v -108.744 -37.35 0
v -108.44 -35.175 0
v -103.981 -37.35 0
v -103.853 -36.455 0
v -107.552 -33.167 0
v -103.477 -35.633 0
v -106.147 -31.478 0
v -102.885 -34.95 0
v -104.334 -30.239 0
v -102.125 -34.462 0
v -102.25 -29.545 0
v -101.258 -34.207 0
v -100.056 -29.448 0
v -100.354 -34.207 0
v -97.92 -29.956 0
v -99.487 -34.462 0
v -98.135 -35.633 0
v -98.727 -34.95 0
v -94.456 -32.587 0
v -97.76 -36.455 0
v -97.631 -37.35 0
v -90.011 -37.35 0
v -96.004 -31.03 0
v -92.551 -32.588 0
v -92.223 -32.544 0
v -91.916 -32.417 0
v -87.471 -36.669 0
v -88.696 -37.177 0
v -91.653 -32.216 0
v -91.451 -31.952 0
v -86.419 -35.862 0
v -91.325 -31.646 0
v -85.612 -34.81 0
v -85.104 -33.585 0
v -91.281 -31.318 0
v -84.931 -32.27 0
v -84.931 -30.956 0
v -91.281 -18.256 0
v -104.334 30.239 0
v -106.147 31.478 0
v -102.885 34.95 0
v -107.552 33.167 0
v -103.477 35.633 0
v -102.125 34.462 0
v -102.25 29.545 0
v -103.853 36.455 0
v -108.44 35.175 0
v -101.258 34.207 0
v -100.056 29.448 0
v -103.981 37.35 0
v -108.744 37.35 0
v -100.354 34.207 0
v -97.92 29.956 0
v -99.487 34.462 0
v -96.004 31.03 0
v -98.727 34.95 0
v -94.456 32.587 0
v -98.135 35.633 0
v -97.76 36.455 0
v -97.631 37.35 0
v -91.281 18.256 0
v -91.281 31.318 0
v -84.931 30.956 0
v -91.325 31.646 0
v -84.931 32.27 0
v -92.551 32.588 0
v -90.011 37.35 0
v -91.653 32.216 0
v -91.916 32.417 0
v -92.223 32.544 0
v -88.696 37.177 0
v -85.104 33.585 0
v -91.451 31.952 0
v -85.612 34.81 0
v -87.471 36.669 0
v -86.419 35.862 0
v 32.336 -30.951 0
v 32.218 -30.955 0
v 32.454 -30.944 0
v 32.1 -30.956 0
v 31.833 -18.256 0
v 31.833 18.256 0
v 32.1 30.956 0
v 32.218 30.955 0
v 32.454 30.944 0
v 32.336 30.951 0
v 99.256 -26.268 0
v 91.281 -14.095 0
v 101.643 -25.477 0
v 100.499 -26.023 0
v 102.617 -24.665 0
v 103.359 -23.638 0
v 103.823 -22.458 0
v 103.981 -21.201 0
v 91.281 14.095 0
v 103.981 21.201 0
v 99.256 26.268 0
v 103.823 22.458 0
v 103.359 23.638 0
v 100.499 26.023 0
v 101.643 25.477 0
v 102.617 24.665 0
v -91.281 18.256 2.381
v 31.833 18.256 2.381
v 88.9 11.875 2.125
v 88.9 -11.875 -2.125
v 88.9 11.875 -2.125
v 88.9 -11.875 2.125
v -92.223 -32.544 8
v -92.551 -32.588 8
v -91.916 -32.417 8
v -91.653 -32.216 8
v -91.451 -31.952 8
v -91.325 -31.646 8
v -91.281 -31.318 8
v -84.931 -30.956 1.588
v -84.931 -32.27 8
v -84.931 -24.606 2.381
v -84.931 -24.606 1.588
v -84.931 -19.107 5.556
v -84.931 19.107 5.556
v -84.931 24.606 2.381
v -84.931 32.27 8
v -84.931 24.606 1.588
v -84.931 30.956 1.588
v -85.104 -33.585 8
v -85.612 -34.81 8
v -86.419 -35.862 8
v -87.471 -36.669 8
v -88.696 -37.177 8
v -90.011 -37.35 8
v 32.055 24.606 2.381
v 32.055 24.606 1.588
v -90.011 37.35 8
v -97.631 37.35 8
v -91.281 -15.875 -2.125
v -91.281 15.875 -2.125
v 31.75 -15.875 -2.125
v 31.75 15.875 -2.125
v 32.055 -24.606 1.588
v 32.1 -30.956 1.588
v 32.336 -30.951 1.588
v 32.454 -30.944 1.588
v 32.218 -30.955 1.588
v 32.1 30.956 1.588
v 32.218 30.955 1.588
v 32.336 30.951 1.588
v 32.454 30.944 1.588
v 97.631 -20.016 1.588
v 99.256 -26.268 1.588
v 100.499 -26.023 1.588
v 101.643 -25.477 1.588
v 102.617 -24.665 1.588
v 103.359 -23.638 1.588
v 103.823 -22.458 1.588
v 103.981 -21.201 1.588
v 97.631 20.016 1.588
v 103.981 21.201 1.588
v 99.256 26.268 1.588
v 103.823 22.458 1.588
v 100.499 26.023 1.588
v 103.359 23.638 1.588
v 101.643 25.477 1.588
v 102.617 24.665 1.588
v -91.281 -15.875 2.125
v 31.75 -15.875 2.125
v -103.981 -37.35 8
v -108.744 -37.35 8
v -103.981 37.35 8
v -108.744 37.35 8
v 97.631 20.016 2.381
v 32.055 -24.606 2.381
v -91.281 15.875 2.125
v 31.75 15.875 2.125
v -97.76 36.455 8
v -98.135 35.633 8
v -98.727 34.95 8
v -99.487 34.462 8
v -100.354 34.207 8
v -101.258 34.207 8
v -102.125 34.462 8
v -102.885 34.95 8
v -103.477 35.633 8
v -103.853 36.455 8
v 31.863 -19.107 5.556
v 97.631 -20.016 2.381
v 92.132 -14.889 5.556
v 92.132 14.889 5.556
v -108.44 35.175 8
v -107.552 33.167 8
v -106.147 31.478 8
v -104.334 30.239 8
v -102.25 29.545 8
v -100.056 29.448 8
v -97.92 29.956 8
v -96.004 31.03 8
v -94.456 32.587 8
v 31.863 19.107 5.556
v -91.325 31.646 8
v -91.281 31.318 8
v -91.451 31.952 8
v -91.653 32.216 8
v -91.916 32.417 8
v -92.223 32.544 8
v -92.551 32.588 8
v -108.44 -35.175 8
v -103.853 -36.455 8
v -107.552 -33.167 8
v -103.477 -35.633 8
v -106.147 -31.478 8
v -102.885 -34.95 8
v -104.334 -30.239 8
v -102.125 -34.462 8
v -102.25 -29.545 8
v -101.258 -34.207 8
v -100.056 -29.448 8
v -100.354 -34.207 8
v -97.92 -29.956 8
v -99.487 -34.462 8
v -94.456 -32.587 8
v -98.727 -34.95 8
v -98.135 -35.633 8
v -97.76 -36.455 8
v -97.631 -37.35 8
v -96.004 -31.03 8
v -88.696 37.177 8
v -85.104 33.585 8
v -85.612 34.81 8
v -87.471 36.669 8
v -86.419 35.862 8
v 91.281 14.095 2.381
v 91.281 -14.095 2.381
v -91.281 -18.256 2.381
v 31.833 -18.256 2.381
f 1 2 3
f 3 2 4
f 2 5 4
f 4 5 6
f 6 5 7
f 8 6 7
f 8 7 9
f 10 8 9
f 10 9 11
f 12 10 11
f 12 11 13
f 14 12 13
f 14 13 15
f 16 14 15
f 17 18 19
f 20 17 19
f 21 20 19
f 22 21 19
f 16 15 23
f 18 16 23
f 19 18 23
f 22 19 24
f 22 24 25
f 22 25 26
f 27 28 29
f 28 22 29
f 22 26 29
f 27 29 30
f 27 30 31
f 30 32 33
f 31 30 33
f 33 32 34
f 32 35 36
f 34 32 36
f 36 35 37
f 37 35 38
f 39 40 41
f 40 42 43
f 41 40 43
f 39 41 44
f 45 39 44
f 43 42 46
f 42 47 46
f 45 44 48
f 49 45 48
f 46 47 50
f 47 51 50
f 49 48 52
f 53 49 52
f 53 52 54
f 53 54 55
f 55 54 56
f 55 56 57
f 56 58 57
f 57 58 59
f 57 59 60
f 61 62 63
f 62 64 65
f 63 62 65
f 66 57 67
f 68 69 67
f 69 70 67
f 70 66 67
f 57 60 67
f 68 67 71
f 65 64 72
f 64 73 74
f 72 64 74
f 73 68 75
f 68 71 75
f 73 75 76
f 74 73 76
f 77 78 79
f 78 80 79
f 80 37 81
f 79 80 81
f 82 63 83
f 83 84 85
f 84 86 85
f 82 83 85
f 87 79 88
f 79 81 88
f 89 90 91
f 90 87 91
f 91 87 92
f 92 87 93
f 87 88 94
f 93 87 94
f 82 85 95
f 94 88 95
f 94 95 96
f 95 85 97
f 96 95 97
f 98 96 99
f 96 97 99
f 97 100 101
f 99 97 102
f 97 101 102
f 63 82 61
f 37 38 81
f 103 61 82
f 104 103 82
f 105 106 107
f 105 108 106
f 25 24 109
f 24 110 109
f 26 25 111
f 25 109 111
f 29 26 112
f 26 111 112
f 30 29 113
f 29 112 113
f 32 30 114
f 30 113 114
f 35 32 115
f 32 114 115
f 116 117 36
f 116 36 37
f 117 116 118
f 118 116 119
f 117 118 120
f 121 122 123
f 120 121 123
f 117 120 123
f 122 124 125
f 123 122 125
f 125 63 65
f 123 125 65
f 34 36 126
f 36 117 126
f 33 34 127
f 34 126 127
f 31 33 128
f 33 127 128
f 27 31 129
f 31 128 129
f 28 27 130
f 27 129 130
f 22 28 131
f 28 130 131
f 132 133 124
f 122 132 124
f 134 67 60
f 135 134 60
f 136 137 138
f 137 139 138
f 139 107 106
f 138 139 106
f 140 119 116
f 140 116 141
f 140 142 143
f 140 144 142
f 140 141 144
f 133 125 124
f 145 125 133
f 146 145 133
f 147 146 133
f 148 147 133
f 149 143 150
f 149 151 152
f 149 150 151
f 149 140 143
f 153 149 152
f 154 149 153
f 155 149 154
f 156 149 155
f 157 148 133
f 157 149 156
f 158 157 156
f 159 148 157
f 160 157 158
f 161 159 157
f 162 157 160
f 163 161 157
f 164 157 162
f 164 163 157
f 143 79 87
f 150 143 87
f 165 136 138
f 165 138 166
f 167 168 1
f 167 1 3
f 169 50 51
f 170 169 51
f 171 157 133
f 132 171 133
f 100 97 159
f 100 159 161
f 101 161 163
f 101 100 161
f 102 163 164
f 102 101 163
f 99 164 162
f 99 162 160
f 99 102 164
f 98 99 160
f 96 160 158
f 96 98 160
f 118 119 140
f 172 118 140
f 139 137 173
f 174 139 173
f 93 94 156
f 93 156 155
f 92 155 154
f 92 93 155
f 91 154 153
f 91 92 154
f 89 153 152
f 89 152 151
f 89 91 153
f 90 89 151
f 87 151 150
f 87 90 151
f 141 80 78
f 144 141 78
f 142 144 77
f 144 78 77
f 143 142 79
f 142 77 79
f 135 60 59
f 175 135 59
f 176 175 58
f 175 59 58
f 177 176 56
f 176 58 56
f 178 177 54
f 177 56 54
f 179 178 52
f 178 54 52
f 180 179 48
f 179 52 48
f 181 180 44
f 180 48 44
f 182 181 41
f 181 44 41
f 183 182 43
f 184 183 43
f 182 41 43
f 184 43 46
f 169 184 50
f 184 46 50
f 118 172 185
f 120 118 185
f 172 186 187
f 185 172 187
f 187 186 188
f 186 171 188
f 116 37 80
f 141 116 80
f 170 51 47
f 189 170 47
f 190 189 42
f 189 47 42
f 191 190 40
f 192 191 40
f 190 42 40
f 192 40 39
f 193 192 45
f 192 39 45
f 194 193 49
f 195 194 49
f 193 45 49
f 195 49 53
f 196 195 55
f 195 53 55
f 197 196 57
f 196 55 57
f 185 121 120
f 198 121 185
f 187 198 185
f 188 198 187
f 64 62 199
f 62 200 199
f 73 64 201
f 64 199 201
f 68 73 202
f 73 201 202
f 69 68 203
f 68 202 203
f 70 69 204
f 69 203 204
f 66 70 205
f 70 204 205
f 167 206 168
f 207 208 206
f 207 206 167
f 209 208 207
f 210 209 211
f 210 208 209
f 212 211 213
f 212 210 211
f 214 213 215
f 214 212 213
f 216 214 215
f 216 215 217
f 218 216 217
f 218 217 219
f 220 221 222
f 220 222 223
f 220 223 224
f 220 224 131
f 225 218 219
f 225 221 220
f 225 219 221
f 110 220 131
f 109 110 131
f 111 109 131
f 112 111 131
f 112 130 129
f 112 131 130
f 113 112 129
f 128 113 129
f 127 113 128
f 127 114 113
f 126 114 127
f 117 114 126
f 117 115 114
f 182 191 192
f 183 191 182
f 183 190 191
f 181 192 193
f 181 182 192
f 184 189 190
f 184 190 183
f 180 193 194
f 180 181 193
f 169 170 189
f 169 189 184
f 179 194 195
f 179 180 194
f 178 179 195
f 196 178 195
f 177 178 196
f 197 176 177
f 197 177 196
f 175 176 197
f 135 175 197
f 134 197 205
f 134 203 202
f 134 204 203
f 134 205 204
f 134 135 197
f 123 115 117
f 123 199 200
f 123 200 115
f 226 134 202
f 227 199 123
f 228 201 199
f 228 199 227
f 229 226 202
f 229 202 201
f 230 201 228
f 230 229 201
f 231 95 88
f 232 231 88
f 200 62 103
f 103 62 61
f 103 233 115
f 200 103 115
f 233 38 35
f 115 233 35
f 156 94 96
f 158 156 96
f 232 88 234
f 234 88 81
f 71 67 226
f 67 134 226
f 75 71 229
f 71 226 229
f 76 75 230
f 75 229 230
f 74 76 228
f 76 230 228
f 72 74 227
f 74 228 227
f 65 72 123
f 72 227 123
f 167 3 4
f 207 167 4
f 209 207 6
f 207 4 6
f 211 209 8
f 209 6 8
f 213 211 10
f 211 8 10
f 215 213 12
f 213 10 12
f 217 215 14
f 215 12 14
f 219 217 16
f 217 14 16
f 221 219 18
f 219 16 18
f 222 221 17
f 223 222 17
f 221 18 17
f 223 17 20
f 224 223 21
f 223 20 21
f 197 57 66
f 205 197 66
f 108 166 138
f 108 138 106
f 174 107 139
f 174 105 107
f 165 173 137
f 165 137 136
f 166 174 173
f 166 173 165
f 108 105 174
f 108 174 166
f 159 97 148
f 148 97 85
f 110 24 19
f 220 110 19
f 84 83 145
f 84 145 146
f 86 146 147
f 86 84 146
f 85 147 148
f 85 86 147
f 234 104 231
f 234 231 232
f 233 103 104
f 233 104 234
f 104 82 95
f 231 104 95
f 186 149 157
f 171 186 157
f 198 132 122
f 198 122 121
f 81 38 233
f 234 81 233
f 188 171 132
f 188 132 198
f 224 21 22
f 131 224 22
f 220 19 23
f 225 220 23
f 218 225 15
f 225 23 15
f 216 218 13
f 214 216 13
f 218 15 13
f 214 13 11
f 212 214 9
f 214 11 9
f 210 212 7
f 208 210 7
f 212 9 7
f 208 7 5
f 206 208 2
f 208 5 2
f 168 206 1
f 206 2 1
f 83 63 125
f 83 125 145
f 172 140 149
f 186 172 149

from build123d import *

# Parameters (mm, degrees)
F1_DEPTH    = 2.125
F3_DEPTH    = 1.5875
F5_DEPTH    = 0.79375
F7_DEPTH    = 3.175
F7_TAPER    = 60
F8_T1_DEPTH = 25.2718606601
F8_T3_DEPTH = 2.4753029305
F9_W        = 5.499261314
F9_H        = 61.9125
F10_DEPTH   = 3.96875
F11_W       = 31.75
F11_H       = 4.25
F12_DEPTH   = 2.38125
F14_DEPTH   = 8
F15_W       = 36.5125
F15_H       = 2.38125
F16_DEPTH   = 25.4
F17_R       = 5.08
F18_R       = 1.27


# Not quite as in the source:
# - a fillet or chamfer that OpenCascade refuses, or shapes differently, is made with other operations: its cross-section is extruded or revolved along the edge and cut away or added


with BuildPart() as f1:
    # F0 (on Top) → F1 (new body, symmetric)
    with BuildSketch(Plane.XY):
        Polygon((31.75, 15.875), (-88.9, 15.875), (-88.9, -15.875), (31.75, -15.875), (88.9, -11.875), (88.9, 11.875), align=None)
    extrude(amount=F1_DEPTH, both=True)

    # F11 (on face) → F12 (join, through all)
    with BuildSketch(Plane(origin=(-88.9, 0, 0), x_dir=(0, -1, 0), z_dir=(-1, 0, 0))):
        Rectangle(F11_W, F11_H)
    extrude(amount=F12_DEPTH)


with BuildPart() as f3:
    # F2 (on Top) → F3 (new body)
    with BuildSketch(Plane.XY):
        Polygon((-91.28125, 18.25625), (31.8332315247, 18.25625), (91.28125, 14.0954088119), (91.28125, -14.0954088119), (31.8332315247, -18.25625), (-91.28125, -18.25625), (-91.28125, -30.95625), (32.27713299, -30.95625), (103.98125, -25.9375891419), (103.98125, 25.9375891419), (32.27713299, 30.95625), (-91.28125, 30.95625), align=None)
    extrude(amount=F3_DEPTH)

    # F4 (on face) → F5 (join)
    with BuildSketch(Plane.XY.offset(1.5875)):
        Polygon((91.28125, -14.0954088119), (31.8332315247, -18.25625), (-91.28125, -18.25625), (-91.28125, -24.60625), (32.0551822574, -24.60625), (97.63125, -20.0164989769), (97.63125, 20.0164989769), (32.0551822574, 24.60625), (-91.28125, 24.60625), (-91.28125, 18.25625), (31.8332315247, 18.25625), (91.28125, 14.0954088119), align=None)
    extrude(amount=F5_DEPTH)

    # F6 (on face) → F7 (join)
    with BuildSketch(Plane.XY.offset(2.38125)):
        Polygon((-91.28125, 24.60625), (-91.28125, -24.60625), (32.0551822574, -24.60625), (97.63125, -20.0164989769), (97.63125, 20.0164989769), (32.0551822574, 24.60625), align=None)
    extrude(amount=F7_DEPTH, taper=F7_TAPER)

    # F8: fillet of radius 5.08 on 4 edges, made by hand

    # F8_s2 → F8_t1 (cut)
    with BuildSketch(Plane.XY.offset(-11.84218033)):
        with BuildLine():
            ThreePointArc((103.98125, -21.2007170099), (102.616637885, -24.6651495556), (99.2559378489, -26.2683196512))
            Line((99.2559378489, -26.2683196512), (103.98125, -25.9375891419))
            Line((103.98125, -25.9375891419), (103.98125, -21.2007170099))
        make_face()
        with BuildLine():
            ThreePointArc((99.2559378489, 26.2683196512), (102.616637885, 24.6651495556), (103.98125, 21.2007170099))
            Line((103.98125, 21.2007170099), (103.98125, 25.9375891419))
            Line((103.98125, 25.9375891419), (99.2559378489, 26.2683196512))
        make_face()
    extrude(amount=F8_T1_DEPTH, mode=Mode.SUBTRACT)

    # F8_s4 → F8_t3 (cut)
    with BuildSketch(Plane.XY.offset(-0.4439014652)):
        with BuildLine():
            ThreePointArc((32.0995724039, -30.95625), (32.2770246261, -30.9531497143), (32.4542602528, -30.9438526413))
            Line((32.4542602528, -30.9438526413), (32.27713299, -30.95625))
            Line((32.27713299, -30.95625), (32.0995724039, -30.95625))
        make_face()
        with BuildLine():
            ThreePointArc((32.0995724039, 30.95625), (32.2770246261, 30.9531497143), (32.4542602528, 30.9438526413))
            Line((32.4542602528, 30.9438526413), (32.27713299, 30.95625))
            Line((32.27713299, 30.95625), (32.0995724039, 30.95625))
        make_face()
    extrude(amount=F8_T3_DEPTH, mode=Mode.SUBTRACT)

    # F9 (on face) → F10 (join, through all)
    with BuildSketch(Plane.XY.offset(1.5875)):
        with Locations((-88.531619343, 0)):
            Rectangle(F9_W, F9_H)
    extrude(amount=F10_DEPTH)

    # F13 (on Top) → F14 (join)
    with BuildSketch(Plane.XY):
        with BuildLine():
            Line((-103.98125, 37.35), (-108.74375, 37.35))
            ThreePointArc((-108.74375, 37.35), (-103.3163078928, 29.8198263217), (-94.45625, 32.5875))
            Line((-94.45625, 32.5875), (-91.28125, 32.5875))
            Line((-91.28125, 32.5875), (-91.28125, 0))
            Line((-91.28125, 0), (-91.28125, -32.5875))
            Line((-91.28125, -32.5875), (-94.45625, -32.5875))
            ThreePointArc((-94.45625, -32.5875), (-103.3163078928, -29.8198263217), (-108.74375, -37.35))
            Line((-108.74375, -37.35), (-103.98125, -37.35))
            ThreePointArc((-103.98125, -37.35), (-100.80625, -34.175), (-97.63125, -37.35))
            Line((-97.63125, -37.35), (-84.93125, -37.35))
            Line((-84.93125, -37.35), (-84.93125, 0))
            Line((-84.93125, 0), (-84.93125, 37.35))
            Line((-84.93125, 37.35), (-97.63125, 37.35))
            ThreePointArc((-97.63125, 37.35), (-100.80625, 34.175), (-103.98125, 37.35))
        make_face()
    extrude(amount=F14_DEPTH)

    # F15 (on face) → F16 (cut)
    with BuildSketch(Plane(origin=(-91.28125, 0, 0), x_dir=(0, -1, 0), z_dir=(-1, 0, 0))):
        with Locations((0, 1.190625)):
            Rectangle(F15_W, F15_H)
    extrude(amount=-F16_DEPTH, mode=Mode.SUBTRACT)

    # F17
    f17_edges = [f3.edges().sort_by_distance(p)[0] for p in [
        (-84.93125, 37.35, 4),
        (-84.93125, -37.35, 4),
    ]]
    fillet(f17_edges, radius=F17_R)

    # F18
    f18_edges = [f3.edges().sort_by_distance(p)[0] for p in [
        (-91.28125, -32.5875, 4),
        (-91.28125, 32.5875, 4),
    ]]
    fillet(f18_edges, radius=F18_R)


solid = Compound([f1.part, f3.part])
